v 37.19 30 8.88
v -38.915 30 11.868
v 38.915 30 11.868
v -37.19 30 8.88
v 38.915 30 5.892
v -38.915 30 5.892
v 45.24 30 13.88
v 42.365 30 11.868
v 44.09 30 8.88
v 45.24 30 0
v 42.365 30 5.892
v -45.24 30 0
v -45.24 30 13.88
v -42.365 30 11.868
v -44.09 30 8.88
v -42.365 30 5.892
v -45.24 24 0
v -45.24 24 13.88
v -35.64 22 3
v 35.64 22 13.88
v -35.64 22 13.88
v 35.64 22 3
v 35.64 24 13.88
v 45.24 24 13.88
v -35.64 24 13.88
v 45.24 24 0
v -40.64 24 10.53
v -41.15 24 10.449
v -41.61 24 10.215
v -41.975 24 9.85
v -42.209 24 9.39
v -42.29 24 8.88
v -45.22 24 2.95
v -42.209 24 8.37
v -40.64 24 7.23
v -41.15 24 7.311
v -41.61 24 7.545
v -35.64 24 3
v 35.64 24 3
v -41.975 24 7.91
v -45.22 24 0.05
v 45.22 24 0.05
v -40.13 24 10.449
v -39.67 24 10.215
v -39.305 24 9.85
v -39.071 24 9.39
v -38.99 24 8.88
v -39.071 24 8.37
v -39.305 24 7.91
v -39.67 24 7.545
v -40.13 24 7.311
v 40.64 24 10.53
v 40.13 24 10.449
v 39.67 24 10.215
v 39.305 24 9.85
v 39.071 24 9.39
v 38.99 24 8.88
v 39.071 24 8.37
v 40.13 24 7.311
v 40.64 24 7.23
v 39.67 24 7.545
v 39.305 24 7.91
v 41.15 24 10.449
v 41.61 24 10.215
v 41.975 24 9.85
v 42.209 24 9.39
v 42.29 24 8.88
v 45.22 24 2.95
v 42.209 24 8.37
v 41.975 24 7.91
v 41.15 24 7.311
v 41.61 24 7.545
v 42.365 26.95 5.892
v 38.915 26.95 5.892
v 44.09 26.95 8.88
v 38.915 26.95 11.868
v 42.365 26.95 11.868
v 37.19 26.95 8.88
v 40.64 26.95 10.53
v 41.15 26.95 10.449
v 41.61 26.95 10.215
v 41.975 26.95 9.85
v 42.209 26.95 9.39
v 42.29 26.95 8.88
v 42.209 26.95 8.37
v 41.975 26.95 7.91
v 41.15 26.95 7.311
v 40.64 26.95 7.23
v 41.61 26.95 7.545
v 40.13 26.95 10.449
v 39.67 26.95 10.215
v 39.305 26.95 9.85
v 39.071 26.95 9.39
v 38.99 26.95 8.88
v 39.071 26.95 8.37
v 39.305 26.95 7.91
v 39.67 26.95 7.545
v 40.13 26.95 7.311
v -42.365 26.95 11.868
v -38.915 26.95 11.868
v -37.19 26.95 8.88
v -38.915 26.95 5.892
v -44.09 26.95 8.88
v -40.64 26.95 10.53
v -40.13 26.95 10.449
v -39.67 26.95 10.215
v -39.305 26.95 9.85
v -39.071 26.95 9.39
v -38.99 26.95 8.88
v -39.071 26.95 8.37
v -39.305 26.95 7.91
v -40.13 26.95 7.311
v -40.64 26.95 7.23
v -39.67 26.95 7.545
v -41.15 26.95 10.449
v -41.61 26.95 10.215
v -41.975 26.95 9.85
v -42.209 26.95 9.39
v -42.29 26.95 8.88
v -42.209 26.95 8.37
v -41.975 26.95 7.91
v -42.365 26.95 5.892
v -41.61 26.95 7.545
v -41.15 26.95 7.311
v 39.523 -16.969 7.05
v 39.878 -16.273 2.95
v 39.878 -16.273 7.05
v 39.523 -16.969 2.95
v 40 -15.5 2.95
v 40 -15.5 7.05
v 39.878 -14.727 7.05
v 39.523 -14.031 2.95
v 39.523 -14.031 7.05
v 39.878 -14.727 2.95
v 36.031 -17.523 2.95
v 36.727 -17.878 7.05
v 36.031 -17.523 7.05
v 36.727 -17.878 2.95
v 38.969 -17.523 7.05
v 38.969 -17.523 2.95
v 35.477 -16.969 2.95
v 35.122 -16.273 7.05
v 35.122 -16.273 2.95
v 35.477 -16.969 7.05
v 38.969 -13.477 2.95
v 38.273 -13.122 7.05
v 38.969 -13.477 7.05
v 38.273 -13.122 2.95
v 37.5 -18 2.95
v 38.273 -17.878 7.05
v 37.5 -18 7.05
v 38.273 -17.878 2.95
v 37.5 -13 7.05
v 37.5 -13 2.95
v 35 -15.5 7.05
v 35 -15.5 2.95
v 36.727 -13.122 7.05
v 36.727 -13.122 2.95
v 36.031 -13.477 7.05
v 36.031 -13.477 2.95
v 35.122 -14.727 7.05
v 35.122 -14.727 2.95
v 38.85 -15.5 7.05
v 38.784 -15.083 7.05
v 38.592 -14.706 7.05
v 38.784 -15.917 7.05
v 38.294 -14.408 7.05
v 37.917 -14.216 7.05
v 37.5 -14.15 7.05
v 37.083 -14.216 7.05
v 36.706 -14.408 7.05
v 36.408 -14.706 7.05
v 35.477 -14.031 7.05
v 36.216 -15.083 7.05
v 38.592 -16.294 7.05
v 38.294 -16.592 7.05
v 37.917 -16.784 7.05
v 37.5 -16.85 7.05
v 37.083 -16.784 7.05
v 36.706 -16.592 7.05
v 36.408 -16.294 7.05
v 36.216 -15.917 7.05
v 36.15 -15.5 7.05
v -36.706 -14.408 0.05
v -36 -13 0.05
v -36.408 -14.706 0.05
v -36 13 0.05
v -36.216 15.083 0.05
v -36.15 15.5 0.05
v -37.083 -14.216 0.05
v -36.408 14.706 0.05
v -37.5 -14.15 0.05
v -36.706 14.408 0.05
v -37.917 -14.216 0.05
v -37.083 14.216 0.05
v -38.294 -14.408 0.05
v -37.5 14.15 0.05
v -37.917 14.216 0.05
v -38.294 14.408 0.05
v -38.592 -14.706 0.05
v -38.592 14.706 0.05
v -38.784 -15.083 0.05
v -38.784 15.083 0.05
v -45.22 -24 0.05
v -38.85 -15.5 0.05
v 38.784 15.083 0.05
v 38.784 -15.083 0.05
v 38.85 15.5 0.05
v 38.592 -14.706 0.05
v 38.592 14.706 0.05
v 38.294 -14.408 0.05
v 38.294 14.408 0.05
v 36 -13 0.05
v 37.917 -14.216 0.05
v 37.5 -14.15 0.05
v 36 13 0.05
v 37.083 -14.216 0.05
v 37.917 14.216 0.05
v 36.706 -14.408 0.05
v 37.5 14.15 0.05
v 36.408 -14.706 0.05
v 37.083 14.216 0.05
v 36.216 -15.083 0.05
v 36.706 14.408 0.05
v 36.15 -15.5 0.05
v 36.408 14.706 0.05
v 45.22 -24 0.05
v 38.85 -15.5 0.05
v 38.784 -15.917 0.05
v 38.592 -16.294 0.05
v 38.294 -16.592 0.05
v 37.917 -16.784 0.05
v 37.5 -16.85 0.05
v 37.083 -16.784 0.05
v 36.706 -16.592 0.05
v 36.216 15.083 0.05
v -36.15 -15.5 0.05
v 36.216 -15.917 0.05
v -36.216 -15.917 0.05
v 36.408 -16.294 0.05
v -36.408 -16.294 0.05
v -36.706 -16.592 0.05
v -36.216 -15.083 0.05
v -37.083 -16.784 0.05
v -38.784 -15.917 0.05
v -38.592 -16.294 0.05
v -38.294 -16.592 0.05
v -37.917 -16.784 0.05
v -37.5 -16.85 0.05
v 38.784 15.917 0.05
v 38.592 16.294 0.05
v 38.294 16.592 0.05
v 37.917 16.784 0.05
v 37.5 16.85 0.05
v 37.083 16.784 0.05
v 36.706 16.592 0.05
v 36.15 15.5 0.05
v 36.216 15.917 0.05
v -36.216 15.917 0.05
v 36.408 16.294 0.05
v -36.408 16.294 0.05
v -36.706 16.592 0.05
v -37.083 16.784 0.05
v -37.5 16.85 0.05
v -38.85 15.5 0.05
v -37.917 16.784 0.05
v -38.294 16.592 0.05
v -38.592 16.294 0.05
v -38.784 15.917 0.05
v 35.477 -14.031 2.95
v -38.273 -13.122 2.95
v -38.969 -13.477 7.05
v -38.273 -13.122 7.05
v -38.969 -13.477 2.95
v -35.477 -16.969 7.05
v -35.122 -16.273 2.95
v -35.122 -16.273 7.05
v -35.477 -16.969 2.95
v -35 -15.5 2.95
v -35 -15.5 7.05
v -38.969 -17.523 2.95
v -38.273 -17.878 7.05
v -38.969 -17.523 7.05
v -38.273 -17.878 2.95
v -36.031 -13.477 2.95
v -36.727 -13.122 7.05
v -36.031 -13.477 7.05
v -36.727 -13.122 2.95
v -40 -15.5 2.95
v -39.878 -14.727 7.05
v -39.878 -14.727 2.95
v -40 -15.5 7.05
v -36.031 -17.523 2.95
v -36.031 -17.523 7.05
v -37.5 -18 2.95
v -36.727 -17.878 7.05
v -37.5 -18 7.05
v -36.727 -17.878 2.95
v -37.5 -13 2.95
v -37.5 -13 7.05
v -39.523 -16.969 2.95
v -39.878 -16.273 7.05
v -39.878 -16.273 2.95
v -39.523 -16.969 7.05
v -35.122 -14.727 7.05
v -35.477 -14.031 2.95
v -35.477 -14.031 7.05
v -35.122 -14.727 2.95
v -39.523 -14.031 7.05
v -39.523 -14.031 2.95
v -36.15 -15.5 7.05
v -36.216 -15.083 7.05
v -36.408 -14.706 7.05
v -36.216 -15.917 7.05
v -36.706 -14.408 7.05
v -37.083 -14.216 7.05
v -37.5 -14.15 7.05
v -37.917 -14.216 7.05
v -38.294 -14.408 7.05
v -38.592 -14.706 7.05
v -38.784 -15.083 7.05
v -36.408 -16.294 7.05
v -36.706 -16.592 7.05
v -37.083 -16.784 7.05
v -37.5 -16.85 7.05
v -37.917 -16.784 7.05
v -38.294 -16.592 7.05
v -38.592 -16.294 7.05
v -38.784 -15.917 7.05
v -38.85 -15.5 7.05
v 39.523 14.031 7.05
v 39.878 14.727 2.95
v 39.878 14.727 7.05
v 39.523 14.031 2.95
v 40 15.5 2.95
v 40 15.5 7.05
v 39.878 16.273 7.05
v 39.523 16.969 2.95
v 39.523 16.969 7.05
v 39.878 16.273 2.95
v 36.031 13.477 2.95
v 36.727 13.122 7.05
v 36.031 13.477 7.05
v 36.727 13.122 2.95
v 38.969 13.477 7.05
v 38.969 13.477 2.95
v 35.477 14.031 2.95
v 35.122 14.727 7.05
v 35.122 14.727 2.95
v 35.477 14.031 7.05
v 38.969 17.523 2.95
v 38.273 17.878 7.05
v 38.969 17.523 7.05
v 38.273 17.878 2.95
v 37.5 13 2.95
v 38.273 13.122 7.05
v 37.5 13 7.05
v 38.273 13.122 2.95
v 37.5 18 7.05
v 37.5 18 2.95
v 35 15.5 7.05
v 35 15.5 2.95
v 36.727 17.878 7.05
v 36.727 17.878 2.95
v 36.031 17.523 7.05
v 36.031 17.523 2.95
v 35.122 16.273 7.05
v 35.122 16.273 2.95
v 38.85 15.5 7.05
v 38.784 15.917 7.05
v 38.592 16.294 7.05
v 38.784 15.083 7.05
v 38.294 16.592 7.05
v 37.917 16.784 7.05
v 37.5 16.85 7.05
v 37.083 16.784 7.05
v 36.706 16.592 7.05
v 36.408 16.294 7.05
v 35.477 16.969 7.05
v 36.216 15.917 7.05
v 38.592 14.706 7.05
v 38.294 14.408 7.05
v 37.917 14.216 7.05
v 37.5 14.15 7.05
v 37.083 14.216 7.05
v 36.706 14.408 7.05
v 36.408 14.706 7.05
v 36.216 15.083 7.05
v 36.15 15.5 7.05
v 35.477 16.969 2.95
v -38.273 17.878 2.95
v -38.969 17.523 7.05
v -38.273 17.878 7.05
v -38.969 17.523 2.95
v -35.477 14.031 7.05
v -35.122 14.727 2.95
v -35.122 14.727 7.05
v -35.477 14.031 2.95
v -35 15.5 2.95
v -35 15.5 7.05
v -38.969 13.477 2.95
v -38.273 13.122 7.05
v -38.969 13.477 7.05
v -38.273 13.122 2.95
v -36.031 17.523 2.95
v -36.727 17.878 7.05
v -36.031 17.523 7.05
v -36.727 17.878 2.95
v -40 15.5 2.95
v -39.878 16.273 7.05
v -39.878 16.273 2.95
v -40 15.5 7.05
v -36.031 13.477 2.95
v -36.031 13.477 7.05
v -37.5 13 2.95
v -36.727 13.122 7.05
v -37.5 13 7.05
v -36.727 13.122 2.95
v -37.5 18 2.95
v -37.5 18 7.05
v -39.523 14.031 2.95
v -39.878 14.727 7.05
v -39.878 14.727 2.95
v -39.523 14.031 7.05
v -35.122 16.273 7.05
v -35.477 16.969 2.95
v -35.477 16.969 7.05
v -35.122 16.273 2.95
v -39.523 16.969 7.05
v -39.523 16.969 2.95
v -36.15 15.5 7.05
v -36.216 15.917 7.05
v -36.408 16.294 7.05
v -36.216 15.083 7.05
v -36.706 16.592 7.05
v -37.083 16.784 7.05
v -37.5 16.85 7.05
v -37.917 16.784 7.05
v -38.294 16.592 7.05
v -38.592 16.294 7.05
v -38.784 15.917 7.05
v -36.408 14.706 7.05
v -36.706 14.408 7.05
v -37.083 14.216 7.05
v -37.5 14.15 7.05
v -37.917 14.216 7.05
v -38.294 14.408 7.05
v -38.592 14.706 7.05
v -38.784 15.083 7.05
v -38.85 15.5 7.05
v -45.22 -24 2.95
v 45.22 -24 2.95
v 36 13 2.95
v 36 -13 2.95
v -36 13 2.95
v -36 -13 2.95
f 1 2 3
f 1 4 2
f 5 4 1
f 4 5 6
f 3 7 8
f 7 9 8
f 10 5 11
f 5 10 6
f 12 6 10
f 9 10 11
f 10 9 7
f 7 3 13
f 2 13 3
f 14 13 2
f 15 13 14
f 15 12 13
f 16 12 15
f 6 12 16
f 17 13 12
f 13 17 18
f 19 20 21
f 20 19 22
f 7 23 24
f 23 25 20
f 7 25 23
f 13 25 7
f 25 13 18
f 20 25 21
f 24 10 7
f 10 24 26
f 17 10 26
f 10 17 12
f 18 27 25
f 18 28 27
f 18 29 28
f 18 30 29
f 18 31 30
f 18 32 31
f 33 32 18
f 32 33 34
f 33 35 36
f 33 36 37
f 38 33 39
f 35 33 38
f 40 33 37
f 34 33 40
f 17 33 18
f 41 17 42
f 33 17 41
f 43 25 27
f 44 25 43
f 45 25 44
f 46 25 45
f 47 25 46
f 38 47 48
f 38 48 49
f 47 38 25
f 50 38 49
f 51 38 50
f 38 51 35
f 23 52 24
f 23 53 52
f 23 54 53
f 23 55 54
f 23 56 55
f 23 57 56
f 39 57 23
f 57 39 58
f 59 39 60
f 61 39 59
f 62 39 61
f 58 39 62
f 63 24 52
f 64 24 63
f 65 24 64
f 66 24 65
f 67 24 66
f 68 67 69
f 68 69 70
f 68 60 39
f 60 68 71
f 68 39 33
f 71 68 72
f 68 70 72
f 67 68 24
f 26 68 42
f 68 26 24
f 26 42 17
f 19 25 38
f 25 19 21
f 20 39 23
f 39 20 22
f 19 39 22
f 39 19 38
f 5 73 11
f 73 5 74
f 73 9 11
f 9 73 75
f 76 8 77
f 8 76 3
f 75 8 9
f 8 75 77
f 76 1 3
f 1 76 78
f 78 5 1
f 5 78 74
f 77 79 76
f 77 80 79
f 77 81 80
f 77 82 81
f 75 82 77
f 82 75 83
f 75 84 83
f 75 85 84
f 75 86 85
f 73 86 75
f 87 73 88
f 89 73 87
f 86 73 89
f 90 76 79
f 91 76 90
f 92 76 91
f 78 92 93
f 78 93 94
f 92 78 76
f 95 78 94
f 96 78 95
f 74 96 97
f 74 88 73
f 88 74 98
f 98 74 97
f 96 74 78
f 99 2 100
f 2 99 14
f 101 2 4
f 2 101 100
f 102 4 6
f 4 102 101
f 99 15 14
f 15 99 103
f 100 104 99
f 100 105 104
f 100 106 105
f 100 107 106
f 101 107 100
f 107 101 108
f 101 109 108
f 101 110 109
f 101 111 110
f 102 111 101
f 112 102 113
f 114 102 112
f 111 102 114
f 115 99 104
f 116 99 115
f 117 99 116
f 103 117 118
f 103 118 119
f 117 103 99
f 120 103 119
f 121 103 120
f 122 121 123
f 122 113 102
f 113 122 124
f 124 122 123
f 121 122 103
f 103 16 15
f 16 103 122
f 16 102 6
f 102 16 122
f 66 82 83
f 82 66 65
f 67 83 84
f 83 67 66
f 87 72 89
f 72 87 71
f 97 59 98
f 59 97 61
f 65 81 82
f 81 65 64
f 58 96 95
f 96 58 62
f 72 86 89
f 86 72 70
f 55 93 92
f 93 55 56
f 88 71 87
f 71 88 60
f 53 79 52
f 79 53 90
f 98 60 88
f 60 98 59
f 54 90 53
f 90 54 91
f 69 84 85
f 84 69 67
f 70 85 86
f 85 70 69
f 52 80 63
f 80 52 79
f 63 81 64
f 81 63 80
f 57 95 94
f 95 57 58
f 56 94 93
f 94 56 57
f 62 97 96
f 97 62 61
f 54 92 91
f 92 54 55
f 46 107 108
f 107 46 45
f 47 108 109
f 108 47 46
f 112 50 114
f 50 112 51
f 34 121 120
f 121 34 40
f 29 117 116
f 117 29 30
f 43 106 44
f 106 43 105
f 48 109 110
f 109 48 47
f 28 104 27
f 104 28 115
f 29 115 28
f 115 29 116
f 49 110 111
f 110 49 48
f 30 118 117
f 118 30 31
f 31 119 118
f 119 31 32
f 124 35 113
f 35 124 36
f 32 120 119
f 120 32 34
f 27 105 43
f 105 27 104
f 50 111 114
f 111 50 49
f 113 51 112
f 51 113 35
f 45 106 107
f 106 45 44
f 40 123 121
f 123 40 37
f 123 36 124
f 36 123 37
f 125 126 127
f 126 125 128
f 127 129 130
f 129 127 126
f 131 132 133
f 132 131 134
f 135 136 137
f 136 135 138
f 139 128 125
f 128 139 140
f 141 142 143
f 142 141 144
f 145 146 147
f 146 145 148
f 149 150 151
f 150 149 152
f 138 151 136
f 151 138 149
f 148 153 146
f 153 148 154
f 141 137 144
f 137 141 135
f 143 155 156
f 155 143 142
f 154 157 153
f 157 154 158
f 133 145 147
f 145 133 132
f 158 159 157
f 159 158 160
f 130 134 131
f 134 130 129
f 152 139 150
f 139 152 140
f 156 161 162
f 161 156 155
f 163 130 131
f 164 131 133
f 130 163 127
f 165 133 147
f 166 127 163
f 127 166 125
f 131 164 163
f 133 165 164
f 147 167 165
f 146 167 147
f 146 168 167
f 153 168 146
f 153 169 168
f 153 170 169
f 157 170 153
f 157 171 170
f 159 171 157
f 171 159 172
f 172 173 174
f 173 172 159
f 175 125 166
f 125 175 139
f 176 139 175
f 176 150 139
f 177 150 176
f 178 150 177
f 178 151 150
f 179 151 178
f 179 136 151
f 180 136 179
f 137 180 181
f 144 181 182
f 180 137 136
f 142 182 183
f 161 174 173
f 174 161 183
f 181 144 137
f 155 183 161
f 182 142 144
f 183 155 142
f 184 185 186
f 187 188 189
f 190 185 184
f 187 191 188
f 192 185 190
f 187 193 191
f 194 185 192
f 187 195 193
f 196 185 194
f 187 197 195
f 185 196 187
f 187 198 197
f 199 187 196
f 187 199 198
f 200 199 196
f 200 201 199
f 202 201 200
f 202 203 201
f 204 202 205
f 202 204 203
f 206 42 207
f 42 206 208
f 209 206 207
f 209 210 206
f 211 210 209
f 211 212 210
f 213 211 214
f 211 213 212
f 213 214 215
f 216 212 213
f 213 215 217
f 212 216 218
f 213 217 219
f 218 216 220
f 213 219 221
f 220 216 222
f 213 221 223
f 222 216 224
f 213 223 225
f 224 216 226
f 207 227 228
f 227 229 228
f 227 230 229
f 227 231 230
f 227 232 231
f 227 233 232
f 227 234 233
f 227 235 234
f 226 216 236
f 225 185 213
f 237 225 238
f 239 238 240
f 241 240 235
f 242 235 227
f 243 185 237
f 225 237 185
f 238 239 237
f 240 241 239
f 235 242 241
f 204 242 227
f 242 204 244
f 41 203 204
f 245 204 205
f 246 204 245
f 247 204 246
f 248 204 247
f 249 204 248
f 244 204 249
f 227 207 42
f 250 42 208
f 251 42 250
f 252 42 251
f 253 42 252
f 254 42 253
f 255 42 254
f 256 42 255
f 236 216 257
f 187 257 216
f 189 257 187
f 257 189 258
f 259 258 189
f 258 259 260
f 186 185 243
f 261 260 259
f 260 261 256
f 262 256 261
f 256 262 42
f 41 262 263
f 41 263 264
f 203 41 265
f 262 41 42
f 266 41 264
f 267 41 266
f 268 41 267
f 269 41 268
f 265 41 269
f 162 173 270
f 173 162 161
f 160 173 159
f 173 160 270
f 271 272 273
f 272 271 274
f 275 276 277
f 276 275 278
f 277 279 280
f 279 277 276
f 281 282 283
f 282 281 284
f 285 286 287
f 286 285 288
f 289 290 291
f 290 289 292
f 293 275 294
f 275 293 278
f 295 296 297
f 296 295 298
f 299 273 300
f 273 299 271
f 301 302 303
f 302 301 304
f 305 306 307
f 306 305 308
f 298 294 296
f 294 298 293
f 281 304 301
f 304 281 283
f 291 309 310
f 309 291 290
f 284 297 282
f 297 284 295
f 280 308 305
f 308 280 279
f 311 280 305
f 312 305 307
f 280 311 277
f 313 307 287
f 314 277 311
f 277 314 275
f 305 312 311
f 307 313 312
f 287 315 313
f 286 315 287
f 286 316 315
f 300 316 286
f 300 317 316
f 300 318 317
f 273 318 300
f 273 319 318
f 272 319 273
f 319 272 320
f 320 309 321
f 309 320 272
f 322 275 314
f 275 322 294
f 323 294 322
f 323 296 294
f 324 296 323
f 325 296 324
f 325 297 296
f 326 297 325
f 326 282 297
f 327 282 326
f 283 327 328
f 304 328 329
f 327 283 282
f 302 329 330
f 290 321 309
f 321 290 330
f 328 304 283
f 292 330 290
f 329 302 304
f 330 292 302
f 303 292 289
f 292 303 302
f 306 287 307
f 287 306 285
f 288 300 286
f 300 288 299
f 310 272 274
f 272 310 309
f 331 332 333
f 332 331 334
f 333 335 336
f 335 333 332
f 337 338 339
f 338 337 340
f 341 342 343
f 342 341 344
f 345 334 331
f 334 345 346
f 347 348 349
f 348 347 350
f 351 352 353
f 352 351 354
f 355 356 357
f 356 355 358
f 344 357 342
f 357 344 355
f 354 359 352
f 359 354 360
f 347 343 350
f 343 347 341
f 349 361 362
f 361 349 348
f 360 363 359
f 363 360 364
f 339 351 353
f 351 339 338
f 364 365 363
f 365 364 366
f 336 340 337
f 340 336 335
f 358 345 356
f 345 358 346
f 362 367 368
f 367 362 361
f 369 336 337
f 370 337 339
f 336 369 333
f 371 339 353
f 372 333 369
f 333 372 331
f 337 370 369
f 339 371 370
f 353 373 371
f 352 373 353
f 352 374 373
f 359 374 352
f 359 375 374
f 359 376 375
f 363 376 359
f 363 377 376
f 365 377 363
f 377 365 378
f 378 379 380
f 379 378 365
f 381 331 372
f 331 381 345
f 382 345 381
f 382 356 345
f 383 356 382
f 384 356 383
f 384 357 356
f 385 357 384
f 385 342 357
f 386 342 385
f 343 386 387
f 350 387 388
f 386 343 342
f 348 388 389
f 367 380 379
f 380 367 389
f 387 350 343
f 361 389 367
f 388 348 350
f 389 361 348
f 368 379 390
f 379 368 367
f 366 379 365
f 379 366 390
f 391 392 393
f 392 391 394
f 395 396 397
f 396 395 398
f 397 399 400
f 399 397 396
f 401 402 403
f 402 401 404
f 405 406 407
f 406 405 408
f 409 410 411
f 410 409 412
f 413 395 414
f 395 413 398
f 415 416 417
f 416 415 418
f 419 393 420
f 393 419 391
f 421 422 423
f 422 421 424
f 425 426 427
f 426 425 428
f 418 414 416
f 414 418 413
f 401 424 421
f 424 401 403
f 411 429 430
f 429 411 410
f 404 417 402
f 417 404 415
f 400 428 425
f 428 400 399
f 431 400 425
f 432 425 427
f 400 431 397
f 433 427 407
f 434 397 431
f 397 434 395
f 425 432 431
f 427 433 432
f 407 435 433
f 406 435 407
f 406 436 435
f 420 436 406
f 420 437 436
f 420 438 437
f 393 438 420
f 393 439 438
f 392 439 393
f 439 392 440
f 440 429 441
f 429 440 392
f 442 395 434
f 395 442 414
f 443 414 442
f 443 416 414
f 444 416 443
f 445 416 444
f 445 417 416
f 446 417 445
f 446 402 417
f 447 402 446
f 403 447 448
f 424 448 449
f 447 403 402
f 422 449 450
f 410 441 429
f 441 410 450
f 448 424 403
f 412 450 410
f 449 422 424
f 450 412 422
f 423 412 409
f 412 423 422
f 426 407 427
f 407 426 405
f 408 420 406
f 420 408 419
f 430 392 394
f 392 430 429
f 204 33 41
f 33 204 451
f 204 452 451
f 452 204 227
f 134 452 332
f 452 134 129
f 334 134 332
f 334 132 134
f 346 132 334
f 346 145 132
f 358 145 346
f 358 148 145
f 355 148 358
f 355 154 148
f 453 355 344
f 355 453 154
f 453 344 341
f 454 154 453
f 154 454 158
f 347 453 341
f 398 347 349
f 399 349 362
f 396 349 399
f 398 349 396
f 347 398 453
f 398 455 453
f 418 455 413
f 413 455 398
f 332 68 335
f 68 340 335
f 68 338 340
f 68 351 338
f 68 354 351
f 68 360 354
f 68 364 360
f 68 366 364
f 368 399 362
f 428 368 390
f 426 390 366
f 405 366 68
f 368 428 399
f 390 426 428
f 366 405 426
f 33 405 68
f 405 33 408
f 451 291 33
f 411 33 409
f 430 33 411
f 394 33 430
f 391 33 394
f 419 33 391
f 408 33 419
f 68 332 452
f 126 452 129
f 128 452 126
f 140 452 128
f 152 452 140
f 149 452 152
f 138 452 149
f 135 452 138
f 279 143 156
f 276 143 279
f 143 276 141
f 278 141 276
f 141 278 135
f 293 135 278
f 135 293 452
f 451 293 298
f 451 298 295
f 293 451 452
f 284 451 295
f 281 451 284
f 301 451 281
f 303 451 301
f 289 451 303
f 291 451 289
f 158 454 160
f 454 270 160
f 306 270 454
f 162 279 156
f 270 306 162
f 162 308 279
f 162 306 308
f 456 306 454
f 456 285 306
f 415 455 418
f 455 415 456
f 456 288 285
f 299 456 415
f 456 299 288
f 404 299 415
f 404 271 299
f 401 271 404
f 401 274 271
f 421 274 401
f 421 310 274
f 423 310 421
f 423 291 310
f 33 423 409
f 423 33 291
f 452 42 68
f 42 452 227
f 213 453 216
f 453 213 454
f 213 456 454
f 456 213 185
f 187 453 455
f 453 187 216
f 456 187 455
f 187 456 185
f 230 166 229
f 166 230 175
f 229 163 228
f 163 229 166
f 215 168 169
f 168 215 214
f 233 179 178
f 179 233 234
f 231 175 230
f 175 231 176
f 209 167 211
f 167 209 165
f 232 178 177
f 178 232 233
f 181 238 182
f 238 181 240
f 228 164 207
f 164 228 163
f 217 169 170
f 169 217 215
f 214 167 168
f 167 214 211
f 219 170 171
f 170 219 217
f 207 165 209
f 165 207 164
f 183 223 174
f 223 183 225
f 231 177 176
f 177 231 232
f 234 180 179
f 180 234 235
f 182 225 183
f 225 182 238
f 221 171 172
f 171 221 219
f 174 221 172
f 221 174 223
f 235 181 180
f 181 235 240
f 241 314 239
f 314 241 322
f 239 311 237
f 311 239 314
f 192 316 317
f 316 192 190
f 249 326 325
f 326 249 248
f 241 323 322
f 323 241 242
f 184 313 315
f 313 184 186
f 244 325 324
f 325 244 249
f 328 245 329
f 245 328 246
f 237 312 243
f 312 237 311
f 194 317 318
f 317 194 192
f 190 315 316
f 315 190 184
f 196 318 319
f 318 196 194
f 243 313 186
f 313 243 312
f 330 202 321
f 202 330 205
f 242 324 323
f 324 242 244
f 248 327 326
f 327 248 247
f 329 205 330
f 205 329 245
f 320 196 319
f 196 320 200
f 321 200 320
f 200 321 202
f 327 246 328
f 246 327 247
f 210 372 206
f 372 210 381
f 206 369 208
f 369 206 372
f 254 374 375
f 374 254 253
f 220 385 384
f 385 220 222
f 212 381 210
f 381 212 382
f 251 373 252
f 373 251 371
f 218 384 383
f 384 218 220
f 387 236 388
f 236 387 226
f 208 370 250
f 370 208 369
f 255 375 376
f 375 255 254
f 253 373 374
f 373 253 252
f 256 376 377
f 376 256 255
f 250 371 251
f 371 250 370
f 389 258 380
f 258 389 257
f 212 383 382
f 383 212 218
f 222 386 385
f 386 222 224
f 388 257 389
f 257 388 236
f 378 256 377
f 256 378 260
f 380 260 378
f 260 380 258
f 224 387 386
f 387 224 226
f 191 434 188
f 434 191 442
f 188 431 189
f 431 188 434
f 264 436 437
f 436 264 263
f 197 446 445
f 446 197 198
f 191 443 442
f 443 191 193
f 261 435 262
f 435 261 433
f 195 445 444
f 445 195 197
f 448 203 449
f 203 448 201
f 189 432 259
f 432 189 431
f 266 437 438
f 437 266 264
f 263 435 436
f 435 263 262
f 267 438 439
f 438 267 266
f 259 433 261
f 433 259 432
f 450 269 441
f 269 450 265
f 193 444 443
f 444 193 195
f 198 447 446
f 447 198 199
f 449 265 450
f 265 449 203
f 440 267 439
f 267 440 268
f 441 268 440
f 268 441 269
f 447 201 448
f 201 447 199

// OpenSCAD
// file: ../configuration/otvory_conf.scad
//Konfigurace pro otvory

//1B) - LCD 2x16
//vzdalenost der
vzdalenost_der_x = 75; //vzdalenost der LCD na ose x
vzdalenost_der_y = 31; //vzdalenost der LCD na ose y
prumer_otvoru = 2.7; //prumer uchytneho sroubu LCD
prumer_sloupku = 5; //prumer sloupku, kterym je veden uchytny sroub. Sloupek zajistuje vhodný posun LCD, aby nekoukal mimo drzak ze predu

//ramecek LCD
ramecek_x = 72; // delka LCD zobrazovace bez PCB
ramecek_y = 26; // vyska LCD zobrazovace bez PCB

//vyska ramecku LCD - vyska LCD na PCB
ramecek_vyska = 7; //vyska ramecku LCD bez PCB
// file: ../configuration/otvory.scad
//Funkce otvuru pro ruzne prvky umistene do celicek

//1B) - LCD 2x16
//--------------------------------------------------------
module otvor_LCD2_16_diry(vyska,zapust,vule_vysky_celicka,pocet_der2,vzdalenost_der,vule_delky_celicka,tloustka_celicka,vule_tlousky,vyska_listy,vzdalenost_der_x,vzdalenost_der_y,prumer_otvoru,prumer_sloupku,ramecek_x,ramecek_y,ramecek_vyska)
{
//otvor na LCD    
translate([0,0,(vyska-2*zapust-vule_vysky_celicka)/2])
cube(size = [ramecek_x,tloustka_celicka,ramecek_y], center = true);    

//diry na srouby pro LCD 
  
translate([vzdalenost_der_x/2,(ramecek_vyska/2-((tloustka_celicka-vule_tlousky)/2)),(((vyska-2*zapust-vule_vysky_celicka)/2)+vzdalenost_der_y/2)])
rotate(a=[90,0,0])      
cylinder(h=ramecek_vyska+0.2, r=(prumer_otvoru/2), center=true);  

translate([-vzdalenost_der_x/2,(ramecek_vyska/2-((tloustka_celicka-vule_tlousky)/2)),(((vyska-2*zapust-vule_vysky_celicka)/2)+vzdalenost_der_y/2)])
rotate(a=[90,0,0])      
cylinder(h=ramecek_vyska+0.2, r=(prumer_otvoru/2), center=true);  

translate([vzdalenost_der_x/2,(ramecek_vyska/2-((tloustka_celicka-vule_tlousky)/2)),(((vyska-2*zapust-vule_vysky_celicka)/2)-vzdalenost_der_y/2)])
rotate(a=[90,0,0])      
cylinder(h=ramecek_vyska+0.2, r=(prumer_otvoru/2), center=true);  

translate([-vzdalenost_der_x/2,(ramecek_vyska/2-((tloustka_celicka-vule_tlousky)/2)),(((vyska-2*zapust-vule_vysky_celicka)/2)-vzdalenost_der_y/2)])
rotate(a=[90,0,0])      
cylinder(h=ramecek_vyska+0.2, r=(prumer_otvoru/2), center=true);      
}    
    
module otvor_LCD2_16_sloupky(vyska,zapust,vule_vysky_celicka,pocet_der2,vzdalenost_der,vule_delky_celicka,tloustka_celicka,vule_tlousky,vyska_listy,vzdalenost_der_x,vzdalenost_der_y,prumer_otvoru,prumer_sloupku,ramecek_x,ramecek_y,ramecek_vyska)
{   
    union() { 
      
        translate([vzdalenost_der_x/2,(ramecek_vyska/2-((tloustka_celicka-vule_tlousky)/2)),(((vyska-2*zapust-vule_vysky_celicka)/2)+vzdalenost_der_y/2)])
            rotate(a=[90,0,0])      
                cylinder(h=ramecek_vyska, r=(prumer_sloupku/2), center=true); 

    translate([-vzdalenost_der_x/2,(ramecek_vyska/2-((tloustka_celicka-vule_tlousky)/2)),(((vyska-2*zapust-vule_vysky_celicka)/2)+vzdalenost_der_y/2)])
            rotate(a=[90,0,0])      
                cylinder(h=ramecek_vyska, r=(prumer_sloupku/2), center=true); 
            
    translate([vzdalenost_der_x/2,(ramecek_vyska/2-((tloustka_celicka-vule_tlousky)/2)),(((vyska-2*zapust-vule_vysky_celicka)/2)-vzdalenost_der_y/2)])
            rotate(a=[90,0,0])      
                cylinder(h=ramecek_vyska, r=(prumer_sloupku/2), center=true);  
   
    translate([-vzdalenost_der_x/2,(ramecek_vyska/2-((tloustka_celicka-vule_tlousky)/2)),(((vyska-2*zapust-vule_vysky_celicka)/2)-vzdalenost_der_y/2)])
            rotate(a=[90,0,0])      
                cylinder(h=ramecek_vyska, r=(prumer_sloupku/2), center=true);         
        
}
}
// file: ../configuration.scad
//ALBASE1115
//------------------------------------------------------------
///*
vzdalenost_der = 10.16; //rozteč děr mezi sebou
radidus_hrany = 5; //radius zaobleni sloupku

//parametry lišty
vzdalenost_od_okraje = 8.88; //vzdalenost stredu upevnovaci diry od kraje desky

//mala hrana
pocet_der1 = 8; //pocet der desky, ponížené o 3

//velka hrana
pocet_der2 = 8; //pocet der desky, ponížené o 3
//*/


//OBECNE PARAMETRY KRABICKY
//------------------------------------------------------------
vyska = 60;  //vyska celeho sloupku, pro zjisteni celkove vysky krabicky je potreba k teto vysce pricist tloustku 2xALBASE, nebo 2xPLBASE

//PLBASE PARAMETRY
//------------------------------------------------------------
tloustka_plbase = 2; //tloustka plbase
prekryti_der=0.3; //sila materiálu, který překrývá díry

//PRIPADNA VYSKA NOZICEK
//------------------------------------------------------------
vyska_nozicky=5;
// file: ../configuration/manufactury_conf.scad
$fn=20; // model faces resolution.

//Sloupek - vyrobni parametry
zapust=6; //zápust ve sloupku pro listu
tolerance=0.5; //tolerance mezi zapusti v sloupku  a v listě
zapust1=zapust+tolerance;

//Sroub - parametry
vyska_hlavy = 3.5;
prumer_hlavy=6;
prumer_sroubu=3.3;

//Matice - parametry
vyska_matky=3;
sirka_matky=6.7;

prumer_matice=6; //hrany k hraně
vyska_matice=3;  //vyska matice
posuv_dorazu=0;  //pro moznost posuvu dorazu pro vsunutí matice
matice_sila_materialu=2; //sila materialu pod maticí na ose z


//Lišta parametry
//---------------------------------------------------
//rozměry výrezu v ose y
vzdalenost_od_diry = 5; //vzdalenost od stredu upevnovaci diry na druhou stranu

//rozmery vyrezu v ose x
vzdalenost_1 = 4.6; //od díry ke kraji
vzdalenost_2 = 5;

vyska_listy=2; //definuje výšku žlábku do kterého se vsunuje čelíčko

//parametry pro úžlabinu
sirka_materialu = 0; //sirka materialu od kraje desky k uzlabine


//Celicko
//--------------------------------------------------
vule_vysky_celicka =0; //definuje vůli celicka v liste
vule_delky_celicka =1;
tloustka_celicka = 3;
vule_tlousky = 0.1;
// file: ../uravena_celicka.scad
use <configuration/celicko.scad>
use <configuration/sloupek.scad>
use <configuration/lista.scad>
use <configuration/otvory.scad>

include <configuration.scad>
include <configuration/manufactury_conf.scad>
include <configuration/otvory_conf.scad>

//Slouzi pro vytvoreni vlastnich celicek dle potreby

//Vytvoreni predniho celicka krabicky
//--------------------------------------------------------
module celicko_predni()
{
translate([0,0,0])
        difference() {
            union() {

                celicko (vyska,zapust,vule_vysky_celicka,pocet_der2+2,vzdalenost_der,vule_delky_celicka,tloustka_celicka,vule_tlousky,vyska_listy,vzdalenost_der_x,vzdalenost_der_y,prumer_otvoru,prumer_sloupku,ramecek_x,ramecek_y,ramecek_vyska);
    
                otvor_LCD2_16_sloupky(vyska,zapust,vule_vysky_celicka,pocet_der2+2,vzdalenost_der,vule_delky_celicka,tloustka_celicka,vule_tlousky,vyska_listy,vzdalenost_der_x,vzdalenost_der_y,prumer_otvoru,prumer_sloupku,ramecek_x,ramecek_y,ramecek_vyska);
                }
                
            otvor_LCD2_16_diry(vyska,zapust,vule_vysky_celicka,pocet_der2+2,vzdalenost_der,vule_delky_celicka,tloustka_celicka,vule_tlousky,vyska_listy,vzdalenost_der_x,vzdalenost_der_y,prumer_otvoru,prumer_sloupku,ramecek_x,ramecek_y,ramecek_vyska);    
    
              }
              
}
 

barva_predni = "cyan";


//Zobrazeni vzhledu navrhovanych celicek
color(barva_predni)
translate([0,-50,0]) 
celicko_predni();
// file: ../configuration/lista.scad
//Funkce generujici listu
module lista (vzdalenost_der,pocet_der,vzdalenost_od_okraje,vzdalenost_od_diry,vzdalenost_1,vzdalenost_2, zapust,vyska_listy,tlouska_celicka,sirka_materialu,vyska_hlavy,prumer_hlavy,prumer_sroubu,prumer_matice,vyska_matice,posuv_dorazu,matice_sila_materialu,vyska_matky,sirka_matky) {
    
difference () {
color("cyan")
    translate([0, 0, 0])
        linear_extrude(height = zapust+vyska_listy)
            square([((pocet_der*vzdalenost_der)+2*vzdalenost_1), vzdalenost_od_okraje+vzdalenost_od_diry], center = true); 
    
    translate([-((((pocet_der*vzdalenost_der)+2*vzdalenost_1)/2)-(vzdalenost_1+vzdalenost_2/2)), 0, (zapust)])
        linear_extrude(height = vyska_listy)
            square([vzdalenost_2, vzdalenost_od_okraje+vzdalenost_od_diry], center = true); 
    
    translate([((((pocet_der*vzdalenost_der)+2*vzdalenost_1)/2)-(vzdalenost_1+vzdalenost_2/2)), 0, (zapust)])
        linear_extrude(height = vyska_listy)
            square([vzdalenost_2, vzdalenost_od_okraje+vzdalenost_od_diry], center = true); 
    
    translate([-((((pocet_der*vzdalenost_der)+2*vzdalenost_1)/2)-(vzdalenost_1/2)), 0, (zapust)])
        linear_extrude(height = vyska_listy)
            square([vzdalenost_1, vzdalenost_od_okraje+vzdalenost_od_diry], center = true); 
    
    translate([((((pocet_der*vzdalenost_der)+2*vzdalenost_1)/2)-(vzdalenost_1/2)), 0, (zapust)])
        linear_extrude(height = vyska_listy)
            square([vzdalenost_1, vzdalenost_od_okraje+vzdalenost_od_diry], center = true); 
    
     translate([0,-((((vzdalenost_od_okraje+vzdalenost_od_diry)/2)-sirka_materialu)-(tlouska_celicka/2)), zapust])
        linear_extrude(height = vyska_listy)
            square([((pocet_der*vzdalenost_der)+2*vzdalenost_1), tlouska_celicka], center = true); 
   
    
//otvory pro matky
//--------------------------------------------------------------
    
    translate([vzdalenost_der*pocet_der/2,-(((vzdalenost_od_okraje+vzdalenost_od_diry)/2)-vzdalenost_od_okraje),vyska_matky/2])  // center top screw
         cylinder (h = vyska_matky+0.1, r= (sirka_matky+0.2)/2, center=true, $fn=6);
        
        
     translate([-vzdalenost_der*pocet_der/2,-(((vzdalenost_od_okraje+vzdalenost_od_diry)/2)-vzdalenost_od_okraje),vyska_matky/2])  // center top screw
        cylinder (h = vyska_matky+0.1, r= (sirka_matky+0.2)/2, center=true, $fn=6);
        
        
 
//otvory pro srouby
//--------------------------------------------------------------

translate([vzdalenost_der*pocet_der/2,-(((vzdalenost_od_okraje+vzdalenost_od_diry)/2)-vzdalenost_od_okraje),vyska_hlavy/2])  // center top screw
        cylinder((2*(zapust+vyska_listy)), d=prumer_sroubu, center=true); 
        
     translate([-vzdalenost_der*pocet_der/2,-(((vzdalenost_od_okraje+vzdalenost_od_diry)/2)-vzdalenost_od_okraje),vyska_hlavy/2])  // center top screw
        cylinder((2*(zapust+vyska_listy)), d=prumer_sroubu, center=true); 



//otvory pro srouby po cele delce
/*
 for (i = [0:1:pocet_der]) {      
 translate([(-i*vzdalenost_der)+vzdalenost_der*pocet_der/2,-(((vzdalenost_od_okraje+vzdalenost_od_diry)/2)-vzdalenost_od_okraje),(zapust-vyska_hlavy)+vyska_hlavy/2])  // center top screw
        cylinder((2*(zapust+vyska_listy)), d=prumer_sroubu, center=true); 
      }
*/      

      
//otvory pro matice
//--------------------------------------------------------------
/*     
 for (i = [1:1:(pocet_der-1)]) {      
 translate([(-i*vzdalenost_der)+vzdalenost_der*pocet_der/2,-((((vzdalenost_od_okraje+vzdalenost_od_diry)/2)-vzdalenost_od_okraje)-((((prumer_matice+posuv_dorazu+vzdalenost_od_diry)/2))-(prumer_matice+posuv_dorazu)/2)),matice_sila_materialu])  // center top screw
      cube([prumer_matice, prumer_matice+posuv_dorazu+vzdalenost_od_diry,vyska_matice], center = true);
  
     }
*/
     
     }    
        } 
        
 //lista (vzdalenost_der,pocet_der1,vzdalenost_od_okraje,vzdalenost_od_diry,vzdalenost_1,vzdalenost_2, zapust,vyska_listy,tloustka_celicka,sirka_materialu,vyska_hlavy,prumer_hlavy,prumer_sroubu,prumer_matice,vyska_matice,posuv_dorazu,matice_sila_materialu);
 
// file: ../configuration/sloupek.scad
//Funkce pro generovani sloupku
module sloupek(
    vyska,
    zapust,
    vzdalenost_der,
    vzdalenost_od_okraje,
    vzdalenost_od_diry,
    radidus_hrany,
    prumer_sroubu,
    prumer_matice,
    vyska_matice,
    posuv_dorazu,
   matice_sila_materialu) {

    difference () {
        union () {
            color("green")
                translate([-(vzdalenost_od_okraje-radidus_hrany),-(vzdalenost_od_okraje-radidus_hrany),0])  // center top screw
                    cylinder(vyska, d=(2*radidus_hrany), center=true);

            color("cyan")
                translate([vzdalenost_der/4, vzdalenost_der/4, -vyska/2])
                    linear_extrude(height = vyska)
                        square([vzdalenost_der/2, vzdalenost_der/2], center = true);    

            color("gray")
                translate([-vzdalenost_od_okraje/2, vzdalenost_der/4, -vyska/2])
                    linear_extrude(height = vyska)
                        square([(vzdalenost_od_okraje), vzdalenost_der/2], center = true);  
                
            color("gray")
                translate([vzdalenost_der/4, -vzdalenost_od_okraje/2, -vyska/2])
                    linear_extrude(height = vyska)
                        square([vzdalenost_der/2, vzdalenost_od_okraje], center = true); 
                
            color("red")
                translate([-(vzdalenost_od_okraje-radidus_hrany)/2, -vzdalenost_od_okraje/2, -vyska/2])
                    linear_extrude(height = vyska)
                        square([vzdalenost_od_okraje-radidus_hrany, vzdalenost_od_okraje], center = true); 
               
            color("red")
                translate([-vzdalenost_od_okraje/2,-(vzdalenost_od_okraje-radidus_hrany)/2, -vyska/2])
                    linear_extrude(height = vyska)
                        square([vzdalenost_od_okraje, vzdalenost_od_okraje-radidus_hrany], center = true); 

            color("green")
                translate([vzdalenost_der, -vzdalenost_od_okraje/2, -(vyska-(2*zapust))/2])
                    linear_extrude(height = (vyska-(2*zapust)))
                        square([vzdalenost_der, vzdalenost_od_okraje], center = true); 
                        
            color("red")
                translate([-vzdalenost_od_okraje/2,vzdalenost_der, -(vyska-(2*zapust))/2])
                    linear_extrude(height = (vyska-(2*zapust)))
                        square([ vzdalenost_od_okraje,vzdalenost_der], center = true);             
              
             color("cyan")
                translate([vzdalenost_od_diry/2, vzdalenost_der, -(vyska-(2*zapust))/2])
                    linear_extrude(height = (vyska-(2*zapust)))
                        square([(vzdalenost_od_diry), vzdalenost_der], center = true);  
              
             color("cyan")
                translate([vzdalenost_der, vzdalenost_od_diry/2, -(vyska-(2*zapust))/2])
                    linear_extrude(height = (vyska-(2*zapust)))
                        square([vzdalenost_der, vzdalenost_od_diry ], center = true);                
        }

        //diry na sroub
            translate([0,0,0])  // center top screw
                cylinder(2*vyska, d=(prumer_sroubu), center=true);

            translate([vzdalenost_der,0,0])  // center top screw
                cylinder(2*vyska, d=(prumer_sroubu), center=true);

            translate([0,vzdalenost_der,0])  // center top screw
                cylinder(2*vyska, d=(prumer_sroubu), center=true);

        //diry na matice
        //1. krajni matice
        translate([vzdalenost_der,(((((prumer_matice)/2)+posuv_dorazu+vzdalenost_od_diry)/2)-(posuv_dorazu+prumer_matice/2)),((vyska-2*zapust)/2-vyska_matice/2)-matice_sila_materialu])  // center top screw
              
        cube([prumer_matice, prumer_matice+posuv_dorazu+vzdalenost_od_diry,vyska_matice], center = true);

        translate([vzdalenost_der,(((((prumer_matice)/2)+posuv_dorazu+vzdalenost_od_diry)/2)-(posuv_dorazu+prumer_matice/2)),-(((vyska-2*zapust)/2-vyska_matice/2)-matice_sila_materialu)])  // center top screw
              
        cube([prumer_matice, prumer_matice+posuv_dorazu+vzdalenost_od_diry,vyska_matice], center = true);


        //2. krajni matice
        translate([(((((prumer_matice)/2)+posuv_dorazu+vzdalenost_od_diry)/2)-(posuv_dorazu+prumer_matice/2)), vzdalenost_der,((vyska-2*zapust)/2-vyska_matice/2)-matice_sila_materialu])  // center top screw
              
        cube([ prumer_matice+posuv_dorazu+vzdalenost_od_diry,prumer_matice,vyska_matice], center = true);

        translate([(((((prumer_matice)/2)+posuv_dorazu+vzdalenost_od_diry)/2)-(posuv_dorazu+prumer_matice/2)), vzdalenost_der,-(((vyska-2*zapust)/2-vyska_matice/2)-matice_sila_materialu)])  // center top screw
              
        cube([ prumer_matice+posuv_dorazu+vzdalenost_od_diry,prumer_matice,vyska_matice], center = true);

        //prostredni dira
        translate([0,(((((prumer_matice)/2)+posuv_dorazu+vzdalenost_od_diry)/2)-(posuv_dorazu+prumer_matice/2)),((vyska)/2-vyska_matice/2)-matice_sila_materialu])  // center top screw
              
        cube([prumer_matice, prumer_matice+posuv_dorazu+vzdalenost_od_diry,vyska_matice], center = true);

        translate([0,(((((prumer_matice)/2)+posuv_dorazu+vzdalenost_od_diry)/2)-(posuv_dorazu+prumer_matice/2)),-(((vyska)/2-vyska_matice/2)-matice_sila_materialu)])  // center top screw
              
        cube([prumer_matice, prumer_matice+posuv_dorazu+vzdalenost_od_diry,vyska_matice], center = true);

        }
}
// file: ../configuration/celicko.scad
//Funkce generujici plne celicko
module celicko (vyska,zapust,vule_vysky_celicka,pocet_der,vzdalenost_der,vule_delky_celicka,tloustka_celicka,vule_tlousky,vyska_listy) {
    difference () {
        color("cyan")
            translate([0, 0, 0])
                linear_extrude(height = vyska-2*zapust-vule_vysky_celicka)
                    square([(pocet_der-1)*vzdalenost_der-vule_delky_celicka, tloustka_celicka-vule_tlousky], center = true);         
    }
}
// main file
use <../configuration/celicko.scad>
use <../configuration/sloupek.scad>
use <../configuration/lista.scad>
use <../uravena_celicka.scad>


include <../configuration/manufactury_conf.scad>
include <../configuration.scad>

barva = "cyan";

rotate([90,0,0])
translate([0,(((vzdalenost_od_diry+vzdalenost_od_okraje)/2)-vzdalenost_od_diry)+((((vzdalenost_od_okraje+vzdalenost_od_diry)/2)-sirka_materialu)),0])
{
    // podstavec drzaku
    //--------------------------------------------------------
    //lista velka 1
    color(barva)
    translate([0,-(((vzdalenost_od_diry+vzdalenost_od_okraje)/2)-vzdalenost_od_diry),-vyska/2])
        rotate(a=[0,0,0])
            lista (vzdalenost_der,pocet_der2,vzdalenost_od_okraje,vzdalenost_od_diry,vzdalenost_1,
                   vzdalenost_2, zapust,vyska_listy,tloustka_celicka,sirka_materialu,vyska_hlavy,
                   prumer_hlavy,prumer_sroubu,prumer_matice,vyska_matice,posuv_dorazu,
                   matice_sila_materialu,vyska_matky,sirka_matky);


    //CELICKA - drzak LCD
    //--------------------------------------------------------
    //celicko predni

    color(barva)
        translate([0,-(((vzdalenost_od_diry+vzdalenost_od_okraje)/2)-vzdalenost_od_diry)-((((vzdalenost_od_okraje+vzdalenost_od_diry)/2)-   sirka_materialu)-(tloustka_celicka/2)),
            -(vyska-2*zapust-vule_vysky_celicka)/2])
            celicko_predni(vyska,zapust,vule_vysky_celicka,pocet_der2,vzdalenost_der,vule_delky_celicka,tloustka_celicka,vule_tlousky);
}
